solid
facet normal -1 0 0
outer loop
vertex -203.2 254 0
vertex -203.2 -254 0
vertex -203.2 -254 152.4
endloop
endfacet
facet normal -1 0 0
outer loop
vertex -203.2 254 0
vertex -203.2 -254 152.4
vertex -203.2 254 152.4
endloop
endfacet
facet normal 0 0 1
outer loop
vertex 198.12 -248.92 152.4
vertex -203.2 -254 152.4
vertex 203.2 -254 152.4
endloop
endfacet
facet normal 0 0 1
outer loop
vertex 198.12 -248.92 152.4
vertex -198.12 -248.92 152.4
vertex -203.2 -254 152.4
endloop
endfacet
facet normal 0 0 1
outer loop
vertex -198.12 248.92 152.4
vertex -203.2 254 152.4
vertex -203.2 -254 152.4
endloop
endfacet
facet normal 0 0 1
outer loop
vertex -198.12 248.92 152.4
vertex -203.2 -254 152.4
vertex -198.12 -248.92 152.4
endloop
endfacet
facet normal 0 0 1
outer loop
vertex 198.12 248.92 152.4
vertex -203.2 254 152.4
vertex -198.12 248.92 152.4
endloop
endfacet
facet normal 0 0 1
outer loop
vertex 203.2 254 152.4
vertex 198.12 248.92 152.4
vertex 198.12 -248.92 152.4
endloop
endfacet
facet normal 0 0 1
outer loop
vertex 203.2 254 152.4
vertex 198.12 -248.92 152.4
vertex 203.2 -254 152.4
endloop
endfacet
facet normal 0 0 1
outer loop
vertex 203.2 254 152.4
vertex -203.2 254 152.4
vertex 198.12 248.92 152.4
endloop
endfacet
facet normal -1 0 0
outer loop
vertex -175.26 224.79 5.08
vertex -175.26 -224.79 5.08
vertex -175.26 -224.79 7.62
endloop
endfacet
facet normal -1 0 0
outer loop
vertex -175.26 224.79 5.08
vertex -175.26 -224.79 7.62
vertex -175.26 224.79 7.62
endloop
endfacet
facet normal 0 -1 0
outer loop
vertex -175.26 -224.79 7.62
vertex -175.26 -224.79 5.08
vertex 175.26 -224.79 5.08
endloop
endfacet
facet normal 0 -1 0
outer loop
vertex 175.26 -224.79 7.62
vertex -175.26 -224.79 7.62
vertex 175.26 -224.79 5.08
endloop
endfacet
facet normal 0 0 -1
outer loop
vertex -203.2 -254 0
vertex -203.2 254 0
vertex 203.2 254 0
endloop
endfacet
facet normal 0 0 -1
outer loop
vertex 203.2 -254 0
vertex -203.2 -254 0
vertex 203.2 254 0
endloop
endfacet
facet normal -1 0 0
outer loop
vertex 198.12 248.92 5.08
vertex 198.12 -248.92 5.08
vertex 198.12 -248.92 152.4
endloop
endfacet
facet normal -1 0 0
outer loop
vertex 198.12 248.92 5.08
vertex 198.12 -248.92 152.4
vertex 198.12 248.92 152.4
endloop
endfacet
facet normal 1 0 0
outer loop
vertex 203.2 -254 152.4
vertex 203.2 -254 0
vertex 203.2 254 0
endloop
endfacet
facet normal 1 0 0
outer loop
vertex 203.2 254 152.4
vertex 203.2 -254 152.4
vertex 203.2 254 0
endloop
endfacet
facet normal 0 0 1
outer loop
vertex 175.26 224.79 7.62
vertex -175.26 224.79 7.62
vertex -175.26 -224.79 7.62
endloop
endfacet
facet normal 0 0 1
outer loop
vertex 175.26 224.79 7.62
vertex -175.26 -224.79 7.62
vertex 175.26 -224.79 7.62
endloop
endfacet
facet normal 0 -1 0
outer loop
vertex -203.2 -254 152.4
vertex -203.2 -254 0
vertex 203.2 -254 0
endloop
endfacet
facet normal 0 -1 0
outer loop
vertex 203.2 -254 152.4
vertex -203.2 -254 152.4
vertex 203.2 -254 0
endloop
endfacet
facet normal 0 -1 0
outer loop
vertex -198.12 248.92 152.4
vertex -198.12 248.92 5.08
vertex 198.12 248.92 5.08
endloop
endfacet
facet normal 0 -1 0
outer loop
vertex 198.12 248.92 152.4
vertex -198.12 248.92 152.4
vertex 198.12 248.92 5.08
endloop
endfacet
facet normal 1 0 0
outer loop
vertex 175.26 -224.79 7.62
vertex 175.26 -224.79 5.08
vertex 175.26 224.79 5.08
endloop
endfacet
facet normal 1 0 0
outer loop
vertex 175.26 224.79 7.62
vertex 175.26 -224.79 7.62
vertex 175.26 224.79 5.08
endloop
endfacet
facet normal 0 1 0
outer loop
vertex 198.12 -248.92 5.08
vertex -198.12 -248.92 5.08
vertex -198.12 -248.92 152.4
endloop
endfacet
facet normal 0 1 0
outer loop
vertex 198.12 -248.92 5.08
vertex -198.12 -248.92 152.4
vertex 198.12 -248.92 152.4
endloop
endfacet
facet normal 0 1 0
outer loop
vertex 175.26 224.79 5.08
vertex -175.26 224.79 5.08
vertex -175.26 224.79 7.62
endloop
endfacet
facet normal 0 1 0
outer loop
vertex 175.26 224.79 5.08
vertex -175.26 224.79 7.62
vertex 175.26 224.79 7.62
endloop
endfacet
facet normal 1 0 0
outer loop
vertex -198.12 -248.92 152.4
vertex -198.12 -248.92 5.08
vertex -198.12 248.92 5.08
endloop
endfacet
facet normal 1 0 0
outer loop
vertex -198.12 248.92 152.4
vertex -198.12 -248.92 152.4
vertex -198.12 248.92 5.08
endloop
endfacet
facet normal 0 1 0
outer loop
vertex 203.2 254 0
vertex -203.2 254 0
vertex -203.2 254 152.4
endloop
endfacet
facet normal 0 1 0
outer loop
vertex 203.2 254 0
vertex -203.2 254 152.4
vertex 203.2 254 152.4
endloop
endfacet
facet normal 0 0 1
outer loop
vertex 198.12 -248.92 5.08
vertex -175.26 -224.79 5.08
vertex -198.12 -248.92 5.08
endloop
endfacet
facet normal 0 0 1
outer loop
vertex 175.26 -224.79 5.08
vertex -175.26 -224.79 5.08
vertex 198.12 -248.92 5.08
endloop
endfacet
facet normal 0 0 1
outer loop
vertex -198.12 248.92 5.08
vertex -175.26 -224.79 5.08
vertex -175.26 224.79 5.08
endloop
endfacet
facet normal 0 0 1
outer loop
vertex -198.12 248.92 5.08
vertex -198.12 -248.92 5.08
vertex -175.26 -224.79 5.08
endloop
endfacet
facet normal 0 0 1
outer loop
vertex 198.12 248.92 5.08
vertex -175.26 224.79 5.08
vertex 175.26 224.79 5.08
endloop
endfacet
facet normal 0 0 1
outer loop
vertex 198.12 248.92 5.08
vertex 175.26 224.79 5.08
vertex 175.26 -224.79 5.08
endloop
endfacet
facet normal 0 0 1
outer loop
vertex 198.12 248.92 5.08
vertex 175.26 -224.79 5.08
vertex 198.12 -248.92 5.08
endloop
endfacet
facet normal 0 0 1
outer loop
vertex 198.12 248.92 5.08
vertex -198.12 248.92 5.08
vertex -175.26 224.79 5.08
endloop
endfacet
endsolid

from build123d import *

# Parameters (mm, degrees)
SKETCH1_W           = 406.4
SKETCH1_H           = 508
BOSS_EXTRUDE1_DEPTH = 152.4
SHELL1_T            = -5.08
SKETCH2_W           = 350.52
SKETCH2_H           = 449.58
BOSS_EXTRUDE2_DEPTH = 2.54


with BuildPart() as part:
    # Sketch1 → Boss-Extrude1 (new body)
    with BuildSketch(Plane.XY):
        Rectangle(SKETCH1_W, SKETCH1_H)
    extrude(amount=BOSS_EXTRUDE1_DEPTH)

    # Shell1
    shell1_openings = [part.faces().sort_by_distance(p)[0] for p in [
        (0, 0, 152.4),
    ]]
    offset(amount=SHELL1_T, openings=shell1_openings, kind=Kind.INTERSECTION)

    # Sketch2 → Boss-Extrude2 (add)
    with BuildSketch(Plane.XY.offset(5.08)):
        Rectangle(SKETCH2_W, SKETCH2_H)
    extrude(amount=BOSS_EXTRUDE2_DEPTH)


solid = part.part
